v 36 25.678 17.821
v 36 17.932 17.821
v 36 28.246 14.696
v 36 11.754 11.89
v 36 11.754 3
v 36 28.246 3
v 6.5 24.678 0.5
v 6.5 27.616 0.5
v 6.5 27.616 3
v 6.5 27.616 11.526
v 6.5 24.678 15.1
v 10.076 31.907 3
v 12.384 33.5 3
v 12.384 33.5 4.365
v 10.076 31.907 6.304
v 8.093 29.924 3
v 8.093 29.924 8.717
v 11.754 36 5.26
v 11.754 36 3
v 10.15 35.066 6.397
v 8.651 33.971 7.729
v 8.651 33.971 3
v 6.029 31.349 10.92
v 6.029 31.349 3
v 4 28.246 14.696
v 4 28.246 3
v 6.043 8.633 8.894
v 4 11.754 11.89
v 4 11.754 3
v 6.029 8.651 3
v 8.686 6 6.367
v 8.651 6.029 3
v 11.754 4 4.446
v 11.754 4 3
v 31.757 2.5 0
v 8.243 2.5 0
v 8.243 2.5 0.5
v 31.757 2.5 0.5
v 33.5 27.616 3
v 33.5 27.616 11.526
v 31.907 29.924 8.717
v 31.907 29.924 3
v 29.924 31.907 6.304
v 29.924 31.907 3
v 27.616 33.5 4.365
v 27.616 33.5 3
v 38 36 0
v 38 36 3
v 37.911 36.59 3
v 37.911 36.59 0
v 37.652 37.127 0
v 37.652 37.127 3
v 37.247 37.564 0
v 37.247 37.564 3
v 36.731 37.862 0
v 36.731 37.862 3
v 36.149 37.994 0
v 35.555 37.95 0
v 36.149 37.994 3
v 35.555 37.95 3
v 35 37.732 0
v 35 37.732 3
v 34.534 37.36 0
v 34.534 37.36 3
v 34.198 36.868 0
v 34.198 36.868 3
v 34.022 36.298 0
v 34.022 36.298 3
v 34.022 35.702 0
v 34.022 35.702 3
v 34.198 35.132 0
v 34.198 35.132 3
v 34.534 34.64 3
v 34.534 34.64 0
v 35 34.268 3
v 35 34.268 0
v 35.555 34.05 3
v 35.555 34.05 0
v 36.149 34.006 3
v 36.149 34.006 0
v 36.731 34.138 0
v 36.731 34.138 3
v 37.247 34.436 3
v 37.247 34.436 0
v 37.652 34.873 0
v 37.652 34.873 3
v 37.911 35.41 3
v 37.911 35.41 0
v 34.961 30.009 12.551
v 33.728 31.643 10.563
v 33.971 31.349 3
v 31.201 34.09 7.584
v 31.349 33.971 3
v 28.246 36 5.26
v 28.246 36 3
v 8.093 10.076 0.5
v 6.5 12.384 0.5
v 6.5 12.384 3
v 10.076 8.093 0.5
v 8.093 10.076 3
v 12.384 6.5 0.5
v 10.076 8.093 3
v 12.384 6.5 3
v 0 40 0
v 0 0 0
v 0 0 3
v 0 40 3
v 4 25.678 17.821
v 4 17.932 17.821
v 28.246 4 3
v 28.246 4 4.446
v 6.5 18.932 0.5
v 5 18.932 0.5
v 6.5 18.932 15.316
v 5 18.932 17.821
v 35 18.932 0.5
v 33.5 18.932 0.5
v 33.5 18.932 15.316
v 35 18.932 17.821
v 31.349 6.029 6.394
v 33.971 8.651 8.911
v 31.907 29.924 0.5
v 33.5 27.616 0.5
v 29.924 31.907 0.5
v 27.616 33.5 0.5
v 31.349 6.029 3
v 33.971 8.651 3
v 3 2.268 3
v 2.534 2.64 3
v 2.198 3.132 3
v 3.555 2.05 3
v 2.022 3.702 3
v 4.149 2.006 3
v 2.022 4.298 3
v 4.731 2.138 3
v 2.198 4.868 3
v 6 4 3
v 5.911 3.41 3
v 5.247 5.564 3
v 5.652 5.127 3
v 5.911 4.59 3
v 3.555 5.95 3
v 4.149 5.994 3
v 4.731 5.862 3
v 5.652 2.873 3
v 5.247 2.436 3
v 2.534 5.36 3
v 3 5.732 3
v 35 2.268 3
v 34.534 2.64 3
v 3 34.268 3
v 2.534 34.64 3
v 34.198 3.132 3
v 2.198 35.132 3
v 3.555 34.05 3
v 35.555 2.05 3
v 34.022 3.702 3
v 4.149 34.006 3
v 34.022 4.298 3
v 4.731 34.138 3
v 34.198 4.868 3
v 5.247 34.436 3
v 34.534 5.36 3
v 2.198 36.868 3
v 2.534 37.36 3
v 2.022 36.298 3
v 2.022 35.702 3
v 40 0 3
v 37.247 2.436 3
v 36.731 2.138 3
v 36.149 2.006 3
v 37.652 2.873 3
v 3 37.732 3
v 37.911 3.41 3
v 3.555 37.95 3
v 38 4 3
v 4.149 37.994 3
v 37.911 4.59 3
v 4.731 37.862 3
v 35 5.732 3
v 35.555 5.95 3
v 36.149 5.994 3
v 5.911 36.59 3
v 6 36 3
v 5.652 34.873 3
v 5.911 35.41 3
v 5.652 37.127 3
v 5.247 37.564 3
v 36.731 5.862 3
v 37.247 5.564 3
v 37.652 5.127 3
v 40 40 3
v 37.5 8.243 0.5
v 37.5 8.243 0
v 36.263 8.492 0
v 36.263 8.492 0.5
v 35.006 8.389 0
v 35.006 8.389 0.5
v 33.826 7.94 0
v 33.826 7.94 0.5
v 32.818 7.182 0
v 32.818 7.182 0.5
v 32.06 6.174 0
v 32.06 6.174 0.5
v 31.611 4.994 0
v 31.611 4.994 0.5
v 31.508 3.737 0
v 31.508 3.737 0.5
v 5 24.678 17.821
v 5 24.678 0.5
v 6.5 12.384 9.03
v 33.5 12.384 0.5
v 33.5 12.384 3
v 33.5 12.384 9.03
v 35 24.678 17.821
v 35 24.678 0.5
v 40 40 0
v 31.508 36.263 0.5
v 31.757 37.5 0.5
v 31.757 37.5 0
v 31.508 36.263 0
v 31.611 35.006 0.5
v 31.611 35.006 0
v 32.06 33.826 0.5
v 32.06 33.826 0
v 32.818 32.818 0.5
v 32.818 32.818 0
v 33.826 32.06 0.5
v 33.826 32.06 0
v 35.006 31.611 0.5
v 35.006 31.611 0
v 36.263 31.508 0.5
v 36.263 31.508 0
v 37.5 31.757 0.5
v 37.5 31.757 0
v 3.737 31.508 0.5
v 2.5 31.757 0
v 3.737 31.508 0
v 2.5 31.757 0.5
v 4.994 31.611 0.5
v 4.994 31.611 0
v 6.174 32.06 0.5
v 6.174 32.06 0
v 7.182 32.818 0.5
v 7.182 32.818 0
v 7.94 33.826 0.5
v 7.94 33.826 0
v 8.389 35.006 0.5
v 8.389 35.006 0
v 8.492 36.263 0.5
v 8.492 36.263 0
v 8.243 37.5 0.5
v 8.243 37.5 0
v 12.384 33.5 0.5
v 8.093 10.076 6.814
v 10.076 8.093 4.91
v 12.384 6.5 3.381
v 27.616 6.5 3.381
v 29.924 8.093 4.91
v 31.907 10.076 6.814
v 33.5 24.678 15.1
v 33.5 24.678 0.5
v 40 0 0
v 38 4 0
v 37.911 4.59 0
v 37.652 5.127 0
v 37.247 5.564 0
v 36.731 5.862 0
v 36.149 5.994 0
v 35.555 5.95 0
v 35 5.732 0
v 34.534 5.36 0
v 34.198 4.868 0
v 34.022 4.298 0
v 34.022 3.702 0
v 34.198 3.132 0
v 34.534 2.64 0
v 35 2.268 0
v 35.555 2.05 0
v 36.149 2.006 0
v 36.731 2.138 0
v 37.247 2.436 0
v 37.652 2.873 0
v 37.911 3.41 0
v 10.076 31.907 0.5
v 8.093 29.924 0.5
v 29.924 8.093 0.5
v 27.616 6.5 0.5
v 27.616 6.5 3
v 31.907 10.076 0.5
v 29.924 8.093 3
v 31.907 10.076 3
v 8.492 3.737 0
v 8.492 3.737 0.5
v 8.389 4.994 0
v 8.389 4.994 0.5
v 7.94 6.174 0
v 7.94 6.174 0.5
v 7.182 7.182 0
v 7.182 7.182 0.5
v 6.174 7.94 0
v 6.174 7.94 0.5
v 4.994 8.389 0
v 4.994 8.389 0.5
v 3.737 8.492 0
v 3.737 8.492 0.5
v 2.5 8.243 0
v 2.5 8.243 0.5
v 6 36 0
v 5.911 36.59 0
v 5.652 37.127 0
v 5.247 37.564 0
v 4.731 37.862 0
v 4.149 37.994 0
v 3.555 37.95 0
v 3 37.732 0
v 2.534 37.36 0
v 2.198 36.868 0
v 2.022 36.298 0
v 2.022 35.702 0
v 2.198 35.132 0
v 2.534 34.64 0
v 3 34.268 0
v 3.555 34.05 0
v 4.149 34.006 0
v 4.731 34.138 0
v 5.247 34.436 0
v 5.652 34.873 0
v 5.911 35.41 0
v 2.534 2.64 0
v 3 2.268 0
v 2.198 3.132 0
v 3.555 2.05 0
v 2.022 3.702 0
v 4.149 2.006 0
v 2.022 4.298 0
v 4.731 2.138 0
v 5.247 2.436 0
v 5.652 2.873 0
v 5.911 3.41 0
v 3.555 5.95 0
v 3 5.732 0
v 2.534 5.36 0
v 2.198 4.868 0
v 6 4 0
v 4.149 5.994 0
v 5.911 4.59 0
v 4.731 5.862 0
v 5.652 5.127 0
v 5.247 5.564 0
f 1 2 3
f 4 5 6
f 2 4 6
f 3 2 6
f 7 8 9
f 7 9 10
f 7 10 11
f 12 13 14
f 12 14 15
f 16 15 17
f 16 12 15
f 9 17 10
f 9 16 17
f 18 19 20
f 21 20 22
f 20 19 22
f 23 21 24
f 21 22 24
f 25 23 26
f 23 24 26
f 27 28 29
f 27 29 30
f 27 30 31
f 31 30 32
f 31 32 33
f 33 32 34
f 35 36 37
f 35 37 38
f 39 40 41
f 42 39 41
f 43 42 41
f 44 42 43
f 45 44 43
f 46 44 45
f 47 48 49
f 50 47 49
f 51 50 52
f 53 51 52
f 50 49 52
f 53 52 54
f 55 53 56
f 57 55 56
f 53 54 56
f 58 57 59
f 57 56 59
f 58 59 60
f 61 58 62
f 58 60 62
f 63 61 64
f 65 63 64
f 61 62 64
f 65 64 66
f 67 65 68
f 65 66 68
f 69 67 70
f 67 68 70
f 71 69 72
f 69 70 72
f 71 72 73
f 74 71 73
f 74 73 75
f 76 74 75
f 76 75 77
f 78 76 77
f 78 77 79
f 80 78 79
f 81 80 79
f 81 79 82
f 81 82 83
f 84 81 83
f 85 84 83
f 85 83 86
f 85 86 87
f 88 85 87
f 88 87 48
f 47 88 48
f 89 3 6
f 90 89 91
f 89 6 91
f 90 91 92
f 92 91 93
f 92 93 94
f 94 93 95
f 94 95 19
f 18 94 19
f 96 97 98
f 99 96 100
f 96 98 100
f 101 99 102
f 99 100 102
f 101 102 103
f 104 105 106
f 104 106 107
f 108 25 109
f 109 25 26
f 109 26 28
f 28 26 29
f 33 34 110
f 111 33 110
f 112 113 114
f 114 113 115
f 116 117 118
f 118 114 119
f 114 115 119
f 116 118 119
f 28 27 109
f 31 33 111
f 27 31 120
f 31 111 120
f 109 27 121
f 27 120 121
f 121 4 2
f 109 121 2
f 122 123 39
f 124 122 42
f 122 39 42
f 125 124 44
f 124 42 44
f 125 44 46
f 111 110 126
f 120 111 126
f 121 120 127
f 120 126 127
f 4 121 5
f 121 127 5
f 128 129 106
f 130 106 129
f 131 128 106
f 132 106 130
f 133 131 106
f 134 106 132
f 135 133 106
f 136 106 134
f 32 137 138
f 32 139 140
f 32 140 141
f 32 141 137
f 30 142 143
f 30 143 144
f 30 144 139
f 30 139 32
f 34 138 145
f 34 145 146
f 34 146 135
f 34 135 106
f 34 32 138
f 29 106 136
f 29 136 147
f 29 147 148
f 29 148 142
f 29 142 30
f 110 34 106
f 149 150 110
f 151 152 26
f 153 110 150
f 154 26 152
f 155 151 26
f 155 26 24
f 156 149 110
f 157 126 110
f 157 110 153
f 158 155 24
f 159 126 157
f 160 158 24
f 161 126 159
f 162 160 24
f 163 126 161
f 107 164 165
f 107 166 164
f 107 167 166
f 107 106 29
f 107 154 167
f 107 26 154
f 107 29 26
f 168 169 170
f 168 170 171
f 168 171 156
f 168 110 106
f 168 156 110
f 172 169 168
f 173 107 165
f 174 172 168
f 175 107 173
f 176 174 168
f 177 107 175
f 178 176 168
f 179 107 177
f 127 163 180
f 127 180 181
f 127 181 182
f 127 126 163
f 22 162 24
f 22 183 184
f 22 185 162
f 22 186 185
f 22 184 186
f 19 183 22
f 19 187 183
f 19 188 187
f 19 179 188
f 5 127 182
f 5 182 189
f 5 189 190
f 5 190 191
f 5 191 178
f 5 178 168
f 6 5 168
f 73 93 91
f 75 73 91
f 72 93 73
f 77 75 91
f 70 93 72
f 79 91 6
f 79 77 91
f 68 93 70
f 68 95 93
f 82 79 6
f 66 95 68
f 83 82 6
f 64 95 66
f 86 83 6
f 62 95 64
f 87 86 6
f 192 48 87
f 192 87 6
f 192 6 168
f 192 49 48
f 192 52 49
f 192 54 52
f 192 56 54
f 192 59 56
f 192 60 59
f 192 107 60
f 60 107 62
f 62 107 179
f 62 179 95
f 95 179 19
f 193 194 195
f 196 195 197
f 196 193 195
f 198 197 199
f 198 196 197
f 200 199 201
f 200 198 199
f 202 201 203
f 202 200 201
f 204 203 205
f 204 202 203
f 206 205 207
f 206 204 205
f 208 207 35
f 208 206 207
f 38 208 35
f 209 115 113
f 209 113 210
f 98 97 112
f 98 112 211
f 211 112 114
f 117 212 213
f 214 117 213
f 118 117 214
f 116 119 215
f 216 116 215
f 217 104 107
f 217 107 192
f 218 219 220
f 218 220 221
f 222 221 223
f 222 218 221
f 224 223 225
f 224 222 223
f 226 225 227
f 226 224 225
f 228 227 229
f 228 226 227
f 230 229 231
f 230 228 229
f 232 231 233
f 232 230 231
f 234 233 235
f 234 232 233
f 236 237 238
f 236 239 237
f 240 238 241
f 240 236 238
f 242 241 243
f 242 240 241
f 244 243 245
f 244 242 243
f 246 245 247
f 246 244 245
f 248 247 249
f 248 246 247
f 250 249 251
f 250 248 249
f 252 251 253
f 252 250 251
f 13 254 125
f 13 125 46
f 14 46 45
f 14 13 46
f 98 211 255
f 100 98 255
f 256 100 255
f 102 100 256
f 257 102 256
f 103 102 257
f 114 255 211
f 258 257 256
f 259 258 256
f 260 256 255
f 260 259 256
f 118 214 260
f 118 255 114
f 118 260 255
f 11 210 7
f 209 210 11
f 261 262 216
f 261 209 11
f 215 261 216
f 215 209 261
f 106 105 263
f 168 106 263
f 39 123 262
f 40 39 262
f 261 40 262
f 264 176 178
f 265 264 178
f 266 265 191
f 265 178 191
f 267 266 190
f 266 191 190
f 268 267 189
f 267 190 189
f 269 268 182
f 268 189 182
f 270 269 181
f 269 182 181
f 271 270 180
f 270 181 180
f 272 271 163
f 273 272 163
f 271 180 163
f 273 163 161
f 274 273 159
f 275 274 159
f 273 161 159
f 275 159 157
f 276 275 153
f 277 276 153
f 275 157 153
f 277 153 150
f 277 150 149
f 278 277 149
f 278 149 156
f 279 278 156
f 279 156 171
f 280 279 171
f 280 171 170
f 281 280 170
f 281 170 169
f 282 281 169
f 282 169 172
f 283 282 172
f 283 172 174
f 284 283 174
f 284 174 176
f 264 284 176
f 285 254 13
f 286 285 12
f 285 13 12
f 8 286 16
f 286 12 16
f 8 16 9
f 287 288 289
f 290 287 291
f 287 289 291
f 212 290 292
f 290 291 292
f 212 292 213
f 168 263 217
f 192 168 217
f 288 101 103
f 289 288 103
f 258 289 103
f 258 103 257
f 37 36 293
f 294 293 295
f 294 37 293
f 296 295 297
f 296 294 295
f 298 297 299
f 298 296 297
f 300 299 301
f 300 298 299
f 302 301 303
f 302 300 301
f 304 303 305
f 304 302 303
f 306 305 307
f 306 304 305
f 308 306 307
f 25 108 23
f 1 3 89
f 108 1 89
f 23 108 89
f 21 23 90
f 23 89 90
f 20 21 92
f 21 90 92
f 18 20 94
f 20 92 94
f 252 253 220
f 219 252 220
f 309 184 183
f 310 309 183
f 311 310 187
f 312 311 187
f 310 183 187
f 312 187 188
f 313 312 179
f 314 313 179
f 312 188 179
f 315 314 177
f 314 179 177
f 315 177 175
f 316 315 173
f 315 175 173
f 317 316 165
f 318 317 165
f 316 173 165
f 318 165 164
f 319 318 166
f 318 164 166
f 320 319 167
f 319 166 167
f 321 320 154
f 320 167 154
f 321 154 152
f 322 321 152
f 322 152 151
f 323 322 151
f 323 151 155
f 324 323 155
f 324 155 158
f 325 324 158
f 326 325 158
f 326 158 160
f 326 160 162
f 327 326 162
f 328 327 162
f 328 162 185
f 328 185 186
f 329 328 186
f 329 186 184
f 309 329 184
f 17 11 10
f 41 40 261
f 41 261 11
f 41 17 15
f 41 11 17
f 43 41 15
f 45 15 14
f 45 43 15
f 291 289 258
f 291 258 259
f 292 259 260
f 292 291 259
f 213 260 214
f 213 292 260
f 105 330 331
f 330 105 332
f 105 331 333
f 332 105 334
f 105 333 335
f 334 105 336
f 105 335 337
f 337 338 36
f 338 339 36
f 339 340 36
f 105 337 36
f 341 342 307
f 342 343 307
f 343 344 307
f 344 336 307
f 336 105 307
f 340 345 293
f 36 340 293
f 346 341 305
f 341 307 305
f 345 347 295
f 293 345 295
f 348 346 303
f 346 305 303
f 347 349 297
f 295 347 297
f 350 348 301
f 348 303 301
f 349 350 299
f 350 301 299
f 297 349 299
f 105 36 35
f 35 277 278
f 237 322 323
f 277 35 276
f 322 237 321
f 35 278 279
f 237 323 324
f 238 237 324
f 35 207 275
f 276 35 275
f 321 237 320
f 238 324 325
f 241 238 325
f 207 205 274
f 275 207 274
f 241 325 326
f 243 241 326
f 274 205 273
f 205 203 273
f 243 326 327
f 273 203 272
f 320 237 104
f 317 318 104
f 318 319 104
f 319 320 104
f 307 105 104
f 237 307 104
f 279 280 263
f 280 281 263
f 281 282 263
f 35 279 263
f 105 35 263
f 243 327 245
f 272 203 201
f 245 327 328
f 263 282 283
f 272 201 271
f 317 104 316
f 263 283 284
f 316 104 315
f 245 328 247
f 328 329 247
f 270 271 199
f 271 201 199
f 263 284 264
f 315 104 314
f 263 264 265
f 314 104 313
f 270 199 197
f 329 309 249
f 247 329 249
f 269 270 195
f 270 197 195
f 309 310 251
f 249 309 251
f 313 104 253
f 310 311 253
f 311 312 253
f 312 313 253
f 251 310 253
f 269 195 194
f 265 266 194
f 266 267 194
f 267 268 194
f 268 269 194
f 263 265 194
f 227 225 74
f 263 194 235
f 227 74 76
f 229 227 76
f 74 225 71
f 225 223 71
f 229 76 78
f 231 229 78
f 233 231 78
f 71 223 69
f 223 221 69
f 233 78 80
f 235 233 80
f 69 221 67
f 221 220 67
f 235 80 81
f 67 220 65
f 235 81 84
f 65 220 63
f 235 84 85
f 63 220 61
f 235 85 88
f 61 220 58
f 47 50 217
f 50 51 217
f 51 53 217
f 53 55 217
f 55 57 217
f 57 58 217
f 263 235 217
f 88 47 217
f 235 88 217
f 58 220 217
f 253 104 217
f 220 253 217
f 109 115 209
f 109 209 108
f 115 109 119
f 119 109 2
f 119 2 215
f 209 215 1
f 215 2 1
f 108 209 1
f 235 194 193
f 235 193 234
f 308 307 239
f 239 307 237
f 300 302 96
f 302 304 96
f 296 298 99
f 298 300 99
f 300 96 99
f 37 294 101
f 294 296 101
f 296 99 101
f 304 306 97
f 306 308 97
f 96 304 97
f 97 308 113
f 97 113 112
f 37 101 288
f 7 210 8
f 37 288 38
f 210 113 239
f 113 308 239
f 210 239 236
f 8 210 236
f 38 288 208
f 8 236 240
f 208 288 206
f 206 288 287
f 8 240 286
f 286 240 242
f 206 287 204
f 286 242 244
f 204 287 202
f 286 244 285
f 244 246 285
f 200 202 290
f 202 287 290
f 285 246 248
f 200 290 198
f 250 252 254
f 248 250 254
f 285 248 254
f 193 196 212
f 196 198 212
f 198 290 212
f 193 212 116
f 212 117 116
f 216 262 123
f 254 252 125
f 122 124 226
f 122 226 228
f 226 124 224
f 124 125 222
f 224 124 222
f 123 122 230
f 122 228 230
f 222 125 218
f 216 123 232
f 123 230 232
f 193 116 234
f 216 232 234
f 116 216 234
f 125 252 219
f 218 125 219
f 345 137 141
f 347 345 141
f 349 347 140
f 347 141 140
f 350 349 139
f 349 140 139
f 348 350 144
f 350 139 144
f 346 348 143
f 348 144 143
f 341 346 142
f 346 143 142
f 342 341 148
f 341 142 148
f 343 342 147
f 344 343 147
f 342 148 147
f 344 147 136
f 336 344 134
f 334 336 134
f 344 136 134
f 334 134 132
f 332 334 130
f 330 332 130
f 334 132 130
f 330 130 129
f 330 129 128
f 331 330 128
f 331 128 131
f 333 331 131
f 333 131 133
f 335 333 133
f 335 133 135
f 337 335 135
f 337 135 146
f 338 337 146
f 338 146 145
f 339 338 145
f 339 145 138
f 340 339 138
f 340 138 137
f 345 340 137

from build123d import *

# Parameters (mm, degrees)
F0_W          = 40
F0_H          = 40
F1_DEPTH      = 3
F2_R          = 2
F3_DEPTH      = 25
F5_DEPTH      = 30
F7_DEPTH      = 36.001
F9_DEPTH      = 36.001
F11_DEPTH     = 36.001
F12_T         = 2.5
F12_T3_DEPTH  = 21.4924225025
F12_T5_DEPTH  = 21.4924225025
F12_T8_ANGLE  = 35.4679110995
F12_T10_ANGLE = 35.4679110995
F12_T12_ANGLE = 35.4679110995
F12_T14_ANGLE = 35.4679110995
F13_W         = 30
F13_H         = 5.7462014769
F14_DEPTH     = 25


# Not quite as in the source:
# - a shell that OpenCascade refuses in one call is made with other operations: the cavity is built on its own and cut out


with BuildPart() as f1:
    # F0 (on Top) → F1 (new body)
    with BuildSketch(Plane.XY):
        with Locations((20, 20)):
            Rectangle(F0_W, F0_H)
    extrude(amount=F1_DEPTH)

    # F2 (on face) → F3 (cut)
    with BuildSketch(Plane.XY.offset(3)):
        with Locations((4, 36)):
            Circle(F2_R)
        with Locations((36, 36)):
            Circle(F2_R)
        with Locations((36, 4)):
            Circle(F2_R)
        with Locations((4, 4)):
            Circle(F2_R)
    extrude(amount=-F3_DEPTH, mode=Mode.SUBTRACT)

    # F4 (on face) → F5 (join)
    with BuildSketch(Plane.XY.offset(3)):
        with BuildLine():
            Line((28.2462112512, 36), (11.7537887488, 36))
            ThreePointArc((11.7537887488, 36), (7.2720779386, 32.7279220614), (4, 28.2462112512))
            Line((4, 28.2462112512), (4, 11.7537887488))
            ThreePointArc((4, 11.7537887488), (7.2720779386, 7.2720779386), (11.7537887488, 4))
            Line((11.7537887488, 4), (28.2462112512, 4))
            ThreePointArc((28.2462112512, 4), (32.7279220614, 7.2720779386), (36, 11.7537887488))
            Line((36, 11.7537887488), (36, 28.2462112512))
            ThreePointArc((36, 28.2462112512), (32.7279220614, 32.7279220614), (28.2462112512, 36))
        make_face()
    extrude(amount=F5_DEPTH)

    # F6 (on face) → F7 (cut, through all)
    with BuildSketch(Plane.YZ.offset(36)):
        Polygon((2.4936108384, 3), (39.5666994154, 38.5907627642), (48.4694316983, 41.8781600893), (2.4936108384, 41.8781600893), align=None)
    extrude(amount=-F7_DEPTH, mode=Mode.SUBTRACT)

    # F8 (on face) → F9 (cut, through all)
    with BuildSketch(Plane.YZ.offset(36)):
        Polygon((20.7161400467, 23.8601379097), (36.8017591536, 4.2844121344), (40.8149436116, 38.1976142526), (20.7161400467, 38.1976142526), align=None)
    extrude(amount=-F9_DEPTH, mode=Mode.SUBTRACT)

    # F10 (on face) → F11 (cut, through all)
    with BuildSketch(Plane.YZ.offset(36)):
        Polygon((13.3647378534, 17.821257934), (36.5101168772, 17.821257934), (38.6116616428, 31.5769352019), (13.3647378534, 31.5769352019), align=None)
    extrude(amount=-F11_DEPTH, mode=Mode.SUBTRACT)

    # F12: shell of thickness 2.5, made by hand


with BuildPart() as f12_core1:
    # F12_t2: copy of F1
    add(f1.part)

    # the walls: a layer under each face that stays
    f12_faces = [f12_core1.faces().sort_by_distance(p)[0] for p in [
        (0, 20, 1.5),
        (20, 40, 1.5),
        (20, 0, 1.5),
        (6.6666666667, 6.6666666667, 3),
        (40, 20, 1.5),
        (2, 4, 1.5),
        (34, 4, 1.5),
        (2, 36, 1.5),
        (34, 36, 1.5),
        (36, 20, 10.410628967),
        (32.7279220614, 7.2720779386, 7.444960048),
        (32.7279220614, 32.7279220614, 8.8481312629),
        (20, 4, 3.7230789413),
        (20, 36, 4.1300647323),
        (7.2720779386, 7.2720779386, 7.444960048),
        (7.2720779386, 32.7279220614, 8.8481312629),
        (4, 20, 10.410628967),
        (20, 30.8391816878, 11.5406936993),
        (20, 21.8052626371, 17.821257934),
        (20, 10.9660809493, 11.1337079083),
    ]]
    thicken(f12_faces, amount=-F12_T, mode=Mode.SUBTRACT)

    # F12_s4 → F12_t3 (cut)
    with BuildSketch(Plane.XZ.offset(-30.7462112512)):
        Polygon((36.025, 3.025), (36, 0.5), (33.5, 0.5), (33.5, 3), align=None)
        Polygon((3.975, 3.025), (4, 0.5), (6.5, 0.5), (6.5, 3), align=None)
    extrude(amount=F12_T3_DEPTH, mode=Mode.SUBTRACT)

    # F12_s6 → F12_t5 (cut)
    with BuildSketch(Plane.YZ.offset(9.2537887488)):
        Polygon((3.975, 3.025), (4, 0.5), (6.5, 0.5), (6.5, 3), align=None)
        Polygon((36.025, 3.025), (36, 0.5), (33.5, 0.5), (33.5, 3), align=None)
    extrude(amount=F12_T5_DEPTH, mode=Mode.SUBTRACT)

    # F12_s7 → F12_t8 (revolve, cut)
    with BuildSketch(Plane(origin=(23.9468753099, 12.3419370383, 0), x_dir=(0, 0, 1), z_dir=(-0.8888888889, -0.4581228473, 0))):
        Polygon((3.025, -9.409679168), (0.5, -9.384679168), (0.5, -6.884679168), (3, -6.884679168), align=None)
    revolve(axis=Axis((20, 20, 3), (0, 0, 1)), revolution_arc=F12_T8_ANGLE, mode=Mode.SUBTRACT)

    # F12_s9 → F12_t10 (revolve, cut)
    with BuildSketch(Plane(origin=(-3.9468753099, 7.6580629617, 0), x_dir=(0, 0, 1), z_dir=(0.4581228473, -0.8888888889, 0))):
        Polygon((3.025, -44.9652347236), (0.5, -44.9402347236), (0.5, -42.4402347236), (3, -42.4402347236), align=None)
    revolve(axis=Axis((20, 20, 3), (0, 0, 1)), revolution_arc=F12_T10_ANGLE, mode=Mode.SUBTRACT)

    # F12_s11 → F12_t12 (revolve, cut)
    with BuildSketch(Plane(origin=(-3.9468753099, 7.6580629617, 0), x_dir=(0, 0, 1), z_dir=(-0.4581228473, 0.8888888889, 0))):
        Polygon((3.025, 8.9152347236), (0.5, 8.9402347236), (0.5, 11.4402347236), (3, 11.4402347236), align=None)
    revolve(axis=Axis((20, 20, 3), (0, 0, 1)), revolution_arc=F12_T12_ANGLE, mode=Mode.SUBTRACT)

    # F12_s13 → F12_t14 (revolve, cut)
    with BuildSketch(Plane(origin=(23.9468753099, 12.3419370383, 0), x_dir=(0, 0, 1), z_dir=(0.8888888889, 0.4581228473, 0))):
        Polygon((3.025, -26.640320832), (0.5, -26.615320832), (0.5, -24.115320832), (3, -24.115320832), align=None)
    revolve(axis=Axis((20, 20, 3), (0, 0, 1)), revolution_arc=F12_T14_ANGLE, mode=Mode.SUBTRACT)


with BuildPart() as f1_1:
    add(f1.part)

    # what is left inside the walls is the cavity
    f12_cavity = [f12_core1.part.solids().sort_by_distance(p)[0] for p in [
        (20, 14.166667, 0.025),
    ]]
    add(f12_cavity, mode=Mode.SUBTRACT)

    # F13 (on face) → F14 (cut)
    with BuildSketch(Plane.XY.offset(17.821257934)):
        with Locations((20, 21.8052626371)):
            Rectangle(F13_W, F13_H)
    extrude(amount=-F14_DEPTH, mode=Mode.SUBTRACT)


solid = f1_1.part
